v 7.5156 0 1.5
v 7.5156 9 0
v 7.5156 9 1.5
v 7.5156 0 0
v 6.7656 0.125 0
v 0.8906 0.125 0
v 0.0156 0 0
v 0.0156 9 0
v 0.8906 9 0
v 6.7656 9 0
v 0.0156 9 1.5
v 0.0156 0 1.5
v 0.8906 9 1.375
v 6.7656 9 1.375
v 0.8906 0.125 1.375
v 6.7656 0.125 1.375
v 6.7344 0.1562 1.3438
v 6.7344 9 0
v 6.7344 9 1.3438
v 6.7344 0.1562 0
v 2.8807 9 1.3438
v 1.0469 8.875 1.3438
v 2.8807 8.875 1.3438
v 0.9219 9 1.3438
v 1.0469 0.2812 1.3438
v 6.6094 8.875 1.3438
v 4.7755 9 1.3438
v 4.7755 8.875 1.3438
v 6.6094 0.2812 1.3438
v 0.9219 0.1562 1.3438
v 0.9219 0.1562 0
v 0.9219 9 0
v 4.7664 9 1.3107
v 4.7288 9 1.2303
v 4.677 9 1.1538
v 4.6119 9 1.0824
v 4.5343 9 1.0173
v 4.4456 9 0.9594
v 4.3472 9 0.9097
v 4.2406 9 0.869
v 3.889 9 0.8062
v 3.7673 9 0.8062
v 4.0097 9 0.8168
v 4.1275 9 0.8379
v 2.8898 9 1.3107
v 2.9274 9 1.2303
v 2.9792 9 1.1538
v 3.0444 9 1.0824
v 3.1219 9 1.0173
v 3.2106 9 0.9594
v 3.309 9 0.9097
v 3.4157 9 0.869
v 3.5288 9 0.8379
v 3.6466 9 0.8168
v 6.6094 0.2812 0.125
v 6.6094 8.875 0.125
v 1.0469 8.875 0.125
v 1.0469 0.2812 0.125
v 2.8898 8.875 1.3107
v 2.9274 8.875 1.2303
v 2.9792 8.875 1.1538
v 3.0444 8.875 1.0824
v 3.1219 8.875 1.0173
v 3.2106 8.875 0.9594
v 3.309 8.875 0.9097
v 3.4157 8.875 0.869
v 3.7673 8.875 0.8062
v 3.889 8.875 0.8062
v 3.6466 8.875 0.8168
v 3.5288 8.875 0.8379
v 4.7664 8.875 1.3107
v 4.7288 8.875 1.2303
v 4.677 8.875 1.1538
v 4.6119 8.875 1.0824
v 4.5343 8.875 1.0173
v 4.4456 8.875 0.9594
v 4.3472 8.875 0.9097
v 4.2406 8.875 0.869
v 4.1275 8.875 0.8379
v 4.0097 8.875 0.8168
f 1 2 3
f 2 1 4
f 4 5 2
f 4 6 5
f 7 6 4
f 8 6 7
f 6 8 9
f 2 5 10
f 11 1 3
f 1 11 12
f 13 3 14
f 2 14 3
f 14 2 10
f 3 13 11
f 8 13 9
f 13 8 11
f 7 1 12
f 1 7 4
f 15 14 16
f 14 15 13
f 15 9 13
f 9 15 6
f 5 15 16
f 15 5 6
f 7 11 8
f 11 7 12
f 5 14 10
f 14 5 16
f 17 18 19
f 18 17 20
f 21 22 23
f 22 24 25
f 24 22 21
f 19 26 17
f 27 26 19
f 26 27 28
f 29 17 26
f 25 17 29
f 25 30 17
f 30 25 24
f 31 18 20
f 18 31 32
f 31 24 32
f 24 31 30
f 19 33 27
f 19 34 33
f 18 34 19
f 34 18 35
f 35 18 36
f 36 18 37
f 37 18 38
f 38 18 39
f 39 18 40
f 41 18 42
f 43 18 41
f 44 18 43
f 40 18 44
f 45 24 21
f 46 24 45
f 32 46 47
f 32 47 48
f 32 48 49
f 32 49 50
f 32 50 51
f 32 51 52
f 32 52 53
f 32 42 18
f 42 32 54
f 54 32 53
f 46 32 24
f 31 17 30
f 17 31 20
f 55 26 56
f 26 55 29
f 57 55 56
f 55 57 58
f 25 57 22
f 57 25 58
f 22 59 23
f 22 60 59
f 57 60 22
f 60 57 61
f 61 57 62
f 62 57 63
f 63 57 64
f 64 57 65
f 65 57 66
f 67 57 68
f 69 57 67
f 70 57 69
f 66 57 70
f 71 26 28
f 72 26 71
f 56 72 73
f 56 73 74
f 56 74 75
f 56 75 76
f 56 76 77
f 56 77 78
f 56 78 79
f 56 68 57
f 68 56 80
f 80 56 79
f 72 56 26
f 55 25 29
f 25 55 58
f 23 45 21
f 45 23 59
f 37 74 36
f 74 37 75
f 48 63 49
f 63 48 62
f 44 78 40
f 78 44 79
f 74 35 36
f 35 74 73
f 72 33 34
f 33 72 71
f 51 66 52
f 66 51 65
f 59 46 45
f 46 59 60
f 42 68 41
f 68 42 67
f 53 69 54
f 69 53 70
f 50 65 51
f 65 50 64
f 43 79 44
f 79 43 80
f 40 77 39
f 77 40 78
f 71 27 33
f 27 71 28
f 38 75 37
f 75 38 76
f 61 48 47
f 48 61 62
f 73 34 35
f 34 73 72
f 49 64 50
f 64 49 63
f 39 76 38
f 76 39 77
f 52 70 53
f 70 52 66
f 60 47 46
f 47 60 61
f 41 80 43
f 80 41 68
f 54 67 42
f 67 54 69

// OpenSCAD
$fn=50;

thickness = 1/8;
g = 3/4; //outer width spacer dim
j = 1/32; //gap space between parts for fit tolerance
w = 8.25 - (2 * g);
d = 9;
h = 1.5;

module openTop(w, d, h, t=1) {
    inner = [w-(2*t), d-(2*t), h];
    outer = [w,d,h];

    difference() {
        cube(outer);
        translate([t,t,t]) cube(inner);
    }
}

module drawer(w, d, h, t=1) {
    difference() {
        openTop(w, d, h, t);
        translate([w/2, d+0.5, h * 1.1])
            resize([w/3,2,h], [1,1,1])
                rotate([90,0,0])
                    cylinder((2 * thickness), r=5);
    }
}

module cabinetBase(w, d, h, t=1) {
    difference() {
        openTop(w, d, h, t);
        translate([t, 2 * t + 1, t]) cube([w - (2 * t), d - (2 * t), h]);
    }
}

module cabinetWithDrawer(w, d, h, g, t=1) {
    dw = w - t - g;
    dd = d - t;
    dh = h - t;

    union() {
        translate([g,0,h])
            mirror([0,0,1])
                cabinetBase(w, d, h, t);
        cube([g, d, h]);
        translate([w,0,0]) cube([g, d, h]);
    }

    translate([t + j, t + j, 0])
        translate([g,0,0])
            drawer(dw-(2*j), dd-j, dh-j, t);
}

translate([j/2,0,0]) cabinetWithDrawer(w,d,h,g,thickness);
